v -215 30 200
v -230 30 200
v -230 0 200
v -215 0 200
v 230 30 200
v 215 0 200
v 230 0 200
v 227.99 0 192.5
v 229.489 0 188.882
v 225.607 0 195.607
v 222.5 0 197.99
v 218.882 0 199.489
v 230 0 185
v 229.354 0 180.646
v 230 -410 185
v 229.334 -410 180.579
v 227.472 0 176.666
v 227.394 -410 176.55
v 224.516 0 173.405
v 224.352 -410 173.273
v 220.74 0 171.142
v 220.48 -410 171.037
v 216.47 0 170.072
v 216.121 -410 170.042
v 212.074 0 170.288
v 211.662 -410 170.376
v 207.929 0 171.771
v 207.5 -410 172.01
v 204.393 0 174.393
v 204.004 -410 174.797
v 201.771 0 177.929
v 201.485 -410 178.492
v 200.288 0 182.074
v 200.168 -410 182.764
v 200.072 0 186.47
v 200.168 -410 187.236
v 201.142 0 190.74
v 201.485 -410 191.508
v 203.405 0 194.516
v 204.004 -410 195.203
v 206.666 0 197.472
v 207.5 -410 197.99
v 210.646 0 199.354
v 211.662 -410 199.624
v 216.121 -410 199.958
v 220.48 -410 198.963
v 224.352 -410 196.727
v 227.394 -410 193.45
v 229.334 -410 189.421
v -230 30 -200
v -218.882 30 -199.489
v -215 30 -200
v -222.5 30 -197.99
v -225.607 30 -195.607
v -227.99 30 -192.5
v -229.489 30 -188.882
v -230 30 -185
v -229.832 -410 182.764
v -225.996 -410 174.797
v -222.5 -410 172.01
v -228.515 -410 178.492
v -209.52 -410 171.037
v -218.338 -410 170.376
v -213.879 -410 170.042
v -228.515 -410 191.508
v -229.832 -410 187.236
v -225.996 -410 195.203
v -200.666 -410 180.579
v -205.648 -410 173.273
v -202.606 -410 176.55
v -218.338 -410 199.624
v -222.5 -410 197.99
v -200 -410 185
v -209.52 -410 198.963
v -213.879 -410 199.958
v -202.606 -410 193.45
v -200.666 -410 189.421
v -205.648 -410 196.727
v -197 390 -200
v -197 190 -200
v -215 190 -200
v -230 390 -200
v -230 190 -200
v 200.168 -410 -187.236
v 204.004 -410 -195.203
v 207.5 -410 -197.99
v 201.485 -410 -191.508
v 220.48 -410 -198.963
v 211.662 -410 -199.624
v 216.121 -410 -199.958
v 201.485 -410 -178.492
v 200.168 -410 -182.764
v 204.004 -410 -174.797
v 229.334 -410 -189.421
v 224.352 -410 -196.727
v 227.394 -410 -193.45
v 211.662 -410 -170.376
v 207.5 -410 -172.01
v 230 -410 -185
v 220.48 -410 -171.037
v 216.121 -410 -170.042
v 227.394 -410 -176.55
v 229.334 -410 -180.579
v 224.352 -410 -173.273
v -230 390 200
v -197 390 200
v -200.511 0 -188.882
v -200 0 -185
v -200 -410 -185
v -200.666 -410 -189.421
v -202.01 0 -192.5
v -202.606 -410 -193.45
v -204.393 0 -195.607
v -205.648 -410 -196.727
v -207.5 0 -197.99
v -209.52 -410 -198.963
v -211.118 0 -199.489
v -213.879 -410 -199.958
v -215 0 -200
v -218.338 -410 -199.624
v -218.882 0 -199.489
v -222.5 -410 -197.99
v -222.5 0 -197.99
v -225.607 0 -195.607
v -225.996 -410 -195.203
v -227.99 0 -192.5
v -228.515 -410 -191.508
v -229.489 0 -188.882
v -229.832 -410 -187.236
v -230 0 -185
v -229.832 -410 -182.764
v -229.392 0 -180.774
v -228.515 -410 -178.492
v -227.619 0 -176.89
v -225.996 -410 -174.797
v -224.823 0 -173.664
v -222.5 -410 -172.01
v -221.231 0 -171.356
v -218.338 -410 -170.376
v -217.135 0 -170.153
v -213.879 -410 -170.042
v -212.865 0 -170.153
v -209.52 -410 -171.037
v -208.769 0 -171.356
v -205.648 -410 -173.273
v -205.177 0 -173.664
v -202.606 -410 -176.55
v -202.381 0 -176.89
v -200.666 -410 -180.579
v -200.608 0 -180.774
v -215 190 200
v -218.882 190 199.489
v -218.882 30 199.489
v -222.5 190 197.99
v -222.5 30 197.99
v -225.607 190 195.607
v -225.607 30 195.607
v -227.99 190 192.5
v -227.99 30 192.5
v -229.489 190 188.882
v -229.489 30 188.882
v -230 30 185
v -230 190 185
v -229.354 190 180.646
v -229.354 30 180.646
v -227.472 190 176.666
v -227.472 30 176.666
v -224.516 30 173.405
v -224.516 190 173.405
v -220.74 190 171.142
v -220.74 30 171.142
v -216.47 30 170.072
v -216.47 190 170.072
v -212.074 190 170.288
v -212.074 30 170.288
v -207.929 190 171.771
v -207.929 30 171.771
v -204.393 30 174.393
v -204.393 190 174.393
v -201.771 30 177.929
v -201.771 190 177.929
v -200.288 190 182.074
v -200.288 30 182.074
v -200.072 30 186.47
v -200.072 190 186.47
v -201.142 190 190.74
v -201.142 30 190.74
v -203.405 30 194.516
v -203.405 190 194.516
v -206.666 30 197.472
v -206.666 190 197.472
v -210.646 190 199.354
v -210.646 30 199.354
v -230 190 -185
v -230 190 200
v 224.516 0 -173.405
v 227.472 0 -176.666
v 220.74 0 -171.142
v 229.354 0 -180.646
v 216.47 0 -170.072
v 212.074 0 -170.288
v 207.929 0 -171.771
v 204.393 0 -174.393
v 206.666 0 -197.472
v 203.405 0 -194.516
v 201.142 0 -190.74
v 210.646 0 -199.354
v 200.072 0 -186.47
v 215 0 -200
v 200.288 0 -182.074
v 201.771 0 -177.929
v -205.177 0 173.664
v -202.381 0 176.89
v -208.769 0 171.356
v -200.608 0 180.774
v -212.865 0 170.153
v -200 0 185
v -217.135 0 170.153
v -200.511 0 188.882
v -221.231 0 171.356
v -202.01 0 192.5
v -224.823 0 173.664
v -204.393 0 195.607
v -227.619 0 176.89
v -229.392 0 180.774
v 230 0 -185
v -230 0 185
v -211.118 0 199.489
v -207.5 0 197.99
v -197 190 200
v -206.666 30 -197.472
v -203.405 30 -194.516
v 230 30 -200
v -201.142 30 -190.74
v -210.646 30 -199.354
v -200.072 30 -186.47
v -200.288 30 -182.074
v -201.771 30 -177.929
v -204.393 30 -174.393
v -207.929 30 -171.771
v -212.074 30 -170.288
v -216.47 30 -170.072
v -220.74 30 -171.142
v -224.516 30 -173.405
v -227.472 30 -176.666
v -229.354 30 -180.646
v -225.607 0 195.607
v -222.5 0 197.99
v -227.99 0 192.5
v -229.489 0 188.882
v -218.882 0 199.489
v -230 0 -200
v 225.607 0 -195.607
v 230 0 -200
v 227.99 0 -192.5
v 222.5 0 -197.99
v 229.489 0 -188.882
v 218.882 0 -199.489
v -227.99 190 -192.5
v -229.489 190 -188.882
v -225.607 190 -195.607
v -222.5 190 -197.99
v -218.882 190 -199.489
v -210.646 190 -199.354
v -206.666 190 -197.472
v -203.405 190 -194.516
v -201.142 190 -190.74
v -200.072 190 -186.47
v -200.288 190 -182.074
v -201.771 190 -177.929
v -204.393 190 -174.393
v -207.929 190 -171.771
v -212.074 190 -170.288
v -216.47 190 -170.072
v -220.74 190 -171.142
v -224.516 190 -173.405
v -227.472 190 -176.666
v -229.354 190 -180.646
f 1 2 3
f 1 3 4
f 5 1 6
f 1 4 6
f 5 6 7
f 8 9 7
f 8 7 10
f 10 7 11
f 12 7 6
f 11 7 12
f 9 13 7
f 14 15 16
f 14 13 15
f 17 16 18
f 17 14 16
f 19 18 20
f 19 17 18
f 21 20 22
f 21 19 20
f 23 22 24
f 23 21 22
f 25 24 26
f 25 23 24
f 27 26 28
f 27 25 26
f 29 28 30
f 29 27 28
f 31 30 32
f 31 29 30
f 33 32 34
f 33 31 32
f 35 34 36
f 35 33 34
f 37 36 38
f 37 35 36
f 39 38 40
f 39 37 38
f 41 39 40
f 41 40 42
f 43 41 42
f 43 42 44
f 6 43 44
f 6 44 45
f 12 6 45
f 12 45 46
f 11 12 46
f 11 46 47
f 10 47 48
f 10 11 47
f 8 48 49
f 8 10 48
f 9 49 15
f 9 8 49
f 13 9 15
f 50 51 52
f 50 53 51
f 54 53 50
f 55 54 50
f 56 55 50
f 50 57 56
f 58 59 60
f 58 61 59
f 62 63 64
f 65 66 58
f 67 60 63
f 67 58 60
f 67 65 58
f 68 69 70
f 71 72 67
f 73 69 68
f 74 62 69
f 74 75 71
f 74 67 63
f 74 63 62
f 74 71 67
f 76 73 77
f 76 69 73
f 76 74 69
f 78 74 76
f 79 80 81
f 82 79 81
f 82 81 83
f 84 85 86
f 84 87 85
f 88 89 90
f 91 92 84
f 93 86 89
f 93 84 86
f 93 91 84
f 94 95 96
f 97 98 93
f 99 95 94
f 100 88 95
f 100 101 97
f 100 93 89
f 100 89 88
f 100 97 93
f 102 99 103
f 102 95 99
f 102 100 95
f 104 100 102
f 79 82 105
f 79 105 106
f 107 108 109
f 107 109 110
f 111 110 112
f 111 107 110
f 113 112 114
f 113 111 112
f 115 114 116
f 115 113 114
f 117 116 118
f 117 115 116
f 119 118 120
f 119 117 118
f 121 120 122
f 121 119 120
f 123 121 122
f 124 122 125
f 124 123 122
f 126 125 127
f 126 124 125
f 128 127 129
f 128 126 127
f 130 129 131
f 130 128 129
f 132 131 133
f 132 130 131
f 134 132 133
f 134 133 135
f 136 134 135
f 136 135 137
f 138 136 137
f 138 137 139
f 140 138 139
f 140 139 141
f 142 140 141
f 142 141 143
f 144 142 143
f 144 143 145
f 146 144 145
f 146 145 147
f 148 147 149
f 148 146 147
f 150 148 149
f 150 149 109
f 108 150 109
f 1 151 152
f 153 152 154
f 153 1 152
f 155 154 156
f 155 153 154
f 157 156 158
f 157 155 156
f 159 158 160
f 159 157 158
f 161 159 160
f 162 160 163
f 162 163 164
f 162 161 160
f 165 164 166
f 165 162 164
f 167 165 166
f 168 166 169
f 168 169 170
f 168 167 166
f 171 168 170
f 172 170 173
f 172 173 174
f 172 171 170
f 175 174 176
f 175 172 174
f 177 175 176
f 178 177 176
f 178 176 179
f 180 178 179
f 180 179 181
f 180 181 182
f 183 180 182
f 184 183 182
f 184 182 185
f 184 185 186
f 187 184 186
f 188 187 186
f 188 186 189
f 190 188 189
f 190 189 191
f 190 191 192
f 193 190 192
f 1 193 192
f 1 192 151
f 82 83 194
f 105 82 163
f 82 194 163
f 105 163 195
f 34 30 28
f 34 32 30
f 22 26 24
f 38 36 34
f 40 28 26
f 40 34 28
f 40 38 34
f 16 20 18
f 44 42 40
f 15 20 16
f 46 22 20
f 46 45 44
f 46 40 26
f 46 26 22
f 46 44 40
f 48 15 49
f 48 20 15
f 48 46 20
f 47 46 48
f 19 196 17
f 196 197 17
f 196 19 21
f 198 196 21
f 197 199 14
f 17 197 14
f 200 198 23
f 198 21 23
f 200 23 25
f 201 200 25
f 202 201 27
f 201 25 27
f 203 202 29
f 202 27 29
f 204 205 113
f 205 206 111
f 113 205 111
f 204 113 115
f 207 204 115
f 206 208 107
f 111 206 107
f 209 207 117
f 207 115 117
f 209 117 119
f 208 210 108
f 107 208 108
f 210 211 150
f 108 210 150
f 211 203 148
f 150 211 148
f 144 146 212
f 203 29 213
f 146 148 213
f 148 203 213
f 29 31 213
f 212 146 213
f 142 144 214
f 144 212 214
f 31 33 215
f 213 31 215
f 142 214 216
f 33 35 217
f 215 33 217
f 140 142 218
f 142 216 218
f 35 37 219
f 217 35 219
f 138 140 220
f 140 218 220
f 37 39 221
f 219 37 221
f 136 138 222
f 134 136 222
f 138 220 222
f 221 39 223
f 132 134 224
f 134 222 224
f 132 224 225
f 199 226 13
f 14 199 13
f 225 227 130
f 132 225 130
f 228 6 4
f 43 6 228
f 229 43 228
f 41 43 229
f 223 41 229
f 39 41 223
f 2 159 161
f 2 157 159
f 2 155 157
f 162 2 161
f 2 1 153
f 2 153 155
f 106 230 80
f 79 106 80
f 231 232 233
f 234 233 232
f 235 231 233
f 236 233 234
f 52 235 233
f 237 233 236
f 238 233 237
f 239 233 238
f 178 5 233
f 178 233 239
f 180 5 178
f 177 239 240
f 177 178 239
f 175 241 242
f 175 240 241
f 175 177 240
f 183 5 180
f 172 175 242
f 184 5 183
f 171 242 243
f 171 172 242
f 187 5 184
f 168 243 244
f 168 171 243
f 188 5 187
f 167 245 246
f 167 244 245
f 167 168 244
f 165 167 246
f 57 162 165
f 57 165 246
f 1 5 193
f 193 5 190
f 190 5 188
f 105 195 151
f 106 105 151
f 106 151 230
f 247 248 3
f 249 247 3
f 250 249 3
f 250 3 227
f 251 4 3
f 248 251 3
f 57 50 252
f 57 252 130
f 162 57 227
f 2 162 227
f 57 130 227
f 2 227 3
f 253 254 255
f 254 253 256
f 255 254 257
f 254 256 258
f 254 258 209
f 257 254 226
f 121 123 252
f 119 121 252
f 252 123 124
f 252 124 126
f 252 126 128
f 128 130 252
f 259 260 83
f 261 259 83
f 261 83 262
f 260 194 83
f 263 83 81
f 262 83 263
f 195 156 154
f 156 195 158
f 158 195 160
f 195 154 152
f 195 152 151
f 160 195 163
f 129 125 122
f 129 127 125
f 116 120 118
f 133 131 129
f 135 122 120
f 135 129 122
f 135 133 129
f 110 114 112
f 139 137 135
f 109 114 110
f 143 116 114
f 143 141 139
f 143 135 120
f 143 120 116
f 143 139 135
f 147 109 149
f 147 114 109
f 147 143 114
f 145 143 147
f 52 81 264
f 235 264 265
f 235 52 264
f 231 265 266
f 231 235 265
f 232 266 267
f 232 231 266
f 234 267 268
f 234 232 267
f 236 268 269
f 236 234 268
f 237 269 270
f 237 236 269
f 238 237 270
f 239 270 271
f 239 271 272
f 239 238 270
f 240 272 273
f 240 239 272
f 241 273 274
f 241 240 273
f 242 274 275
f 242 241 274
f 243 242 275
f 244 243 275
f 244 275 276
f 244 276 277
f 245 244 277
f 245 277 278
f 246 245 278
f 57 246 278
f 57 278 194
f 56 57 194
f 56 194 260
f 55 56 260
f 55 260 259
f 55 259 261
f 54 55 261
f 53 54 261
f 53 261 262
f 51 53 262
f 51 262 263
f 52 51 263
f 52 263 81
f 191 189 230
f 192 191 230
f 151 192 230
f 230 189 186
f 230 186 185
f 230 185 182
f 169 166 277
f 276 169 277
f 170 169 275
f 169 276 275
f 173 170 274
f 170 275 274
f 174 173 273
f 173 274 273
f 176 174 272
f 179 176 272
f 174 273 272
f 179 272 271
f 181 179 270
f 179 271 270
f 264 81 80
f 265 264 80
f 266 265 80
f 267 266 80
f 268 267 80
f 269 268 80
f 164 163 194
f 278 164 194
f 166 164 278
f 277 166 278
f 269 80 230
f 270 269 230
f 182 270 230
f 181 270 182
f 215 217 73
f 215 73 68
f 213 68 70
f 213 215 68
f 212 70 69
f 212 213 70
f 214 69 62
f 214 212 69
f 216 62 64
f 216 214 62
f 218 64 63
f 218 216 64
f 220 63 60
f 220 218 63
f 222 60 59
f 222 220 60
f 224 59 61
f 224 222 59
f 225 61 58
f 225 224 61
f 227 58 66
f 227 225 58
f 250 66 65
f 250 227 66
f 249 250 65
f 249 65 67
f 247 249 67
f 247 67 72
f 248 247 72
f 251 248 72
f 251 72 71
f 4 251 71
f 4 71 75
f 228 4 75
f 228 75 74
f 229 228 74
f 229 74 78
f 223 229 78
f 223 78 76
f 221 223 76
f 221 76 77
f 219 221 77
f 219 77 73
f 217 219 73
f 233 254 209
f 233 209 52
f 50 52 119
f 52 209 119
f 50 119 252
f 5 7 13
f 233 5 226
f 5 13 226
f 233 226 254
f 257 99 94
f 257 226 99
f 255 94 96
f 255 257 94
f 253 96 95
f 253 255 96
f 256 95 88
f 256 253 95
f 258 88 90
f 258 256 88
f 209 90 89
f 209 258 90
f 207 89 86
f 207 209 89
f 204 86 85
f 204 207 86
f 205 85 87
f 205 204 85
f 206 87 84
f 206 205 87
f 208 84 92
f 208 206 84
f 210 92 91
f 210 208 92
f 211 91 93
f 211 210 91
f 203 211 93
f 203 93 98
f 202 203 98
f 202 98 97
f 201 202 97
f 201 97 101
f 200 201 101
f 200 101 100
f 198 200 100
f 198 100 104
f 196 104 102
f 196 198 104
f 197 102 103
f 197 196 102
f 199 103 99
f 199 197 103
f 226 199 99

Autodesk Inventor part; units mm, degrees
ref_plane "YZ Plane" through (0, 0, 0) normal (1, 0, 0) x (0, 1, 0)
ref_plane "XZ Plane" through (0, 0, 0) normal (0, 1, 0) x (-1, 0, 0)
ref_plane "XY Plane" through (0, 0, 0) normal (0, 0, 1) x (1, 0, 0)
sketch "Esquisse1" plane through (0, 0, 0) normal (0, 1, 0) x (-1, 0, 0)
  line L0 (230, 200) -> (-230, 200)
  line L1 (-230, 200) -> (-230, -200)
  line L2 (-230, -200) -> (230, -200)
  line L3 (230, -200) -> (230, 200)
  point P0 (0, 0)
  dimension "d0" = 400
  dimension "d1" = 460
  dimension "d2" = 230
  dimension "d3" = 200
extrude "Extrusion1" add sketch "Esquisse1" along normal blind 30
sketch "Esquisse2" plane through (0, 0, 0) normal (0, -1, 0) x (1, 0, 0)
  circle A0 centre (215, 185) radius 15
  circle A1 centre (215, -185) radius 15
  circle A2 centre (-215, -185) radius 15
  circle A3 centre (-215, 185) radius 15
  line L0 (-230, 200) -> (230, 200) projected
  line L1 (230, 200) -> (230, -200) projected
  line L2 (230, -200) -> (-230, -200) projected
  line L3 (-230, -200) -> (-230, 200) projected
  point P0 (0, 0)
  dimension "d6" = 30
  dimension "d7" = 30
  dimension "d8" = 30
  dimension "d9" = 30
  dimension "d10" = 15
  dimension "d11" = 15
  dimension "d12" = 15
  dimension "d13" = 15
  dimension "d14" = 15
  dimension "d15" = 15
  dimension "d16" = 15
  dimension "d17" = 15
extrude "Extrusion2" add sketch "Esquisse2" along normal blind 410 contours A0 | A1 | A3 | A2
sketch "Esquisse3" plane through (0, 30, 0) normal (0, 1, 0) x (1, 0, 0)
  arc A0 (-215, -200) -> (-230, -185) centre (-215, -185) ccw projected
  circle A1 centre (-215, -185) radius 15
  arc A2 (-230, 185) -> (-215, 200) centre (-215, 185) ccw projected
  circle A3 centre (-215, 185) radius 15
  point P0 (0, 0)
extrude "Extrusion3" add sketch "Esquisse3" along normal blind 160
sketch "Esquisse4" plane through (-215, 190, 185) normal (0, 1, 0) x (1, 0, 0)
  line L0 (430, 385) -> (0, 385) projected
  line L1 (-15, -15) -> (18, -15)
  line L2 (18, -15) -> (18, 385)
  line L3 (18, 385) -> (-15, 385)
  line L4 (-15, 385) -> (-15, -15)
  point P0 (215, 185)
  dimension "d22" = 33
extrude "Extrusion4" add sketch "Esquisse4" along normal blind 200
equation "\"d2\" = 0.5 * d1"
equation "\"d3\" = 0.5 * d0"
equation "\"d7\" = d6"
equation "\"d8\" = d6"
equation "\"d9\" = d6"
equation "\"d12\" = d11"
equation "\"d13\" = d10"
equation "\"d14\" = d11"
equation "\"d15\" = d11"
equation "\"d16\" = d11"
equation "\"d17\" = d11"
properties part number "Chaise"
